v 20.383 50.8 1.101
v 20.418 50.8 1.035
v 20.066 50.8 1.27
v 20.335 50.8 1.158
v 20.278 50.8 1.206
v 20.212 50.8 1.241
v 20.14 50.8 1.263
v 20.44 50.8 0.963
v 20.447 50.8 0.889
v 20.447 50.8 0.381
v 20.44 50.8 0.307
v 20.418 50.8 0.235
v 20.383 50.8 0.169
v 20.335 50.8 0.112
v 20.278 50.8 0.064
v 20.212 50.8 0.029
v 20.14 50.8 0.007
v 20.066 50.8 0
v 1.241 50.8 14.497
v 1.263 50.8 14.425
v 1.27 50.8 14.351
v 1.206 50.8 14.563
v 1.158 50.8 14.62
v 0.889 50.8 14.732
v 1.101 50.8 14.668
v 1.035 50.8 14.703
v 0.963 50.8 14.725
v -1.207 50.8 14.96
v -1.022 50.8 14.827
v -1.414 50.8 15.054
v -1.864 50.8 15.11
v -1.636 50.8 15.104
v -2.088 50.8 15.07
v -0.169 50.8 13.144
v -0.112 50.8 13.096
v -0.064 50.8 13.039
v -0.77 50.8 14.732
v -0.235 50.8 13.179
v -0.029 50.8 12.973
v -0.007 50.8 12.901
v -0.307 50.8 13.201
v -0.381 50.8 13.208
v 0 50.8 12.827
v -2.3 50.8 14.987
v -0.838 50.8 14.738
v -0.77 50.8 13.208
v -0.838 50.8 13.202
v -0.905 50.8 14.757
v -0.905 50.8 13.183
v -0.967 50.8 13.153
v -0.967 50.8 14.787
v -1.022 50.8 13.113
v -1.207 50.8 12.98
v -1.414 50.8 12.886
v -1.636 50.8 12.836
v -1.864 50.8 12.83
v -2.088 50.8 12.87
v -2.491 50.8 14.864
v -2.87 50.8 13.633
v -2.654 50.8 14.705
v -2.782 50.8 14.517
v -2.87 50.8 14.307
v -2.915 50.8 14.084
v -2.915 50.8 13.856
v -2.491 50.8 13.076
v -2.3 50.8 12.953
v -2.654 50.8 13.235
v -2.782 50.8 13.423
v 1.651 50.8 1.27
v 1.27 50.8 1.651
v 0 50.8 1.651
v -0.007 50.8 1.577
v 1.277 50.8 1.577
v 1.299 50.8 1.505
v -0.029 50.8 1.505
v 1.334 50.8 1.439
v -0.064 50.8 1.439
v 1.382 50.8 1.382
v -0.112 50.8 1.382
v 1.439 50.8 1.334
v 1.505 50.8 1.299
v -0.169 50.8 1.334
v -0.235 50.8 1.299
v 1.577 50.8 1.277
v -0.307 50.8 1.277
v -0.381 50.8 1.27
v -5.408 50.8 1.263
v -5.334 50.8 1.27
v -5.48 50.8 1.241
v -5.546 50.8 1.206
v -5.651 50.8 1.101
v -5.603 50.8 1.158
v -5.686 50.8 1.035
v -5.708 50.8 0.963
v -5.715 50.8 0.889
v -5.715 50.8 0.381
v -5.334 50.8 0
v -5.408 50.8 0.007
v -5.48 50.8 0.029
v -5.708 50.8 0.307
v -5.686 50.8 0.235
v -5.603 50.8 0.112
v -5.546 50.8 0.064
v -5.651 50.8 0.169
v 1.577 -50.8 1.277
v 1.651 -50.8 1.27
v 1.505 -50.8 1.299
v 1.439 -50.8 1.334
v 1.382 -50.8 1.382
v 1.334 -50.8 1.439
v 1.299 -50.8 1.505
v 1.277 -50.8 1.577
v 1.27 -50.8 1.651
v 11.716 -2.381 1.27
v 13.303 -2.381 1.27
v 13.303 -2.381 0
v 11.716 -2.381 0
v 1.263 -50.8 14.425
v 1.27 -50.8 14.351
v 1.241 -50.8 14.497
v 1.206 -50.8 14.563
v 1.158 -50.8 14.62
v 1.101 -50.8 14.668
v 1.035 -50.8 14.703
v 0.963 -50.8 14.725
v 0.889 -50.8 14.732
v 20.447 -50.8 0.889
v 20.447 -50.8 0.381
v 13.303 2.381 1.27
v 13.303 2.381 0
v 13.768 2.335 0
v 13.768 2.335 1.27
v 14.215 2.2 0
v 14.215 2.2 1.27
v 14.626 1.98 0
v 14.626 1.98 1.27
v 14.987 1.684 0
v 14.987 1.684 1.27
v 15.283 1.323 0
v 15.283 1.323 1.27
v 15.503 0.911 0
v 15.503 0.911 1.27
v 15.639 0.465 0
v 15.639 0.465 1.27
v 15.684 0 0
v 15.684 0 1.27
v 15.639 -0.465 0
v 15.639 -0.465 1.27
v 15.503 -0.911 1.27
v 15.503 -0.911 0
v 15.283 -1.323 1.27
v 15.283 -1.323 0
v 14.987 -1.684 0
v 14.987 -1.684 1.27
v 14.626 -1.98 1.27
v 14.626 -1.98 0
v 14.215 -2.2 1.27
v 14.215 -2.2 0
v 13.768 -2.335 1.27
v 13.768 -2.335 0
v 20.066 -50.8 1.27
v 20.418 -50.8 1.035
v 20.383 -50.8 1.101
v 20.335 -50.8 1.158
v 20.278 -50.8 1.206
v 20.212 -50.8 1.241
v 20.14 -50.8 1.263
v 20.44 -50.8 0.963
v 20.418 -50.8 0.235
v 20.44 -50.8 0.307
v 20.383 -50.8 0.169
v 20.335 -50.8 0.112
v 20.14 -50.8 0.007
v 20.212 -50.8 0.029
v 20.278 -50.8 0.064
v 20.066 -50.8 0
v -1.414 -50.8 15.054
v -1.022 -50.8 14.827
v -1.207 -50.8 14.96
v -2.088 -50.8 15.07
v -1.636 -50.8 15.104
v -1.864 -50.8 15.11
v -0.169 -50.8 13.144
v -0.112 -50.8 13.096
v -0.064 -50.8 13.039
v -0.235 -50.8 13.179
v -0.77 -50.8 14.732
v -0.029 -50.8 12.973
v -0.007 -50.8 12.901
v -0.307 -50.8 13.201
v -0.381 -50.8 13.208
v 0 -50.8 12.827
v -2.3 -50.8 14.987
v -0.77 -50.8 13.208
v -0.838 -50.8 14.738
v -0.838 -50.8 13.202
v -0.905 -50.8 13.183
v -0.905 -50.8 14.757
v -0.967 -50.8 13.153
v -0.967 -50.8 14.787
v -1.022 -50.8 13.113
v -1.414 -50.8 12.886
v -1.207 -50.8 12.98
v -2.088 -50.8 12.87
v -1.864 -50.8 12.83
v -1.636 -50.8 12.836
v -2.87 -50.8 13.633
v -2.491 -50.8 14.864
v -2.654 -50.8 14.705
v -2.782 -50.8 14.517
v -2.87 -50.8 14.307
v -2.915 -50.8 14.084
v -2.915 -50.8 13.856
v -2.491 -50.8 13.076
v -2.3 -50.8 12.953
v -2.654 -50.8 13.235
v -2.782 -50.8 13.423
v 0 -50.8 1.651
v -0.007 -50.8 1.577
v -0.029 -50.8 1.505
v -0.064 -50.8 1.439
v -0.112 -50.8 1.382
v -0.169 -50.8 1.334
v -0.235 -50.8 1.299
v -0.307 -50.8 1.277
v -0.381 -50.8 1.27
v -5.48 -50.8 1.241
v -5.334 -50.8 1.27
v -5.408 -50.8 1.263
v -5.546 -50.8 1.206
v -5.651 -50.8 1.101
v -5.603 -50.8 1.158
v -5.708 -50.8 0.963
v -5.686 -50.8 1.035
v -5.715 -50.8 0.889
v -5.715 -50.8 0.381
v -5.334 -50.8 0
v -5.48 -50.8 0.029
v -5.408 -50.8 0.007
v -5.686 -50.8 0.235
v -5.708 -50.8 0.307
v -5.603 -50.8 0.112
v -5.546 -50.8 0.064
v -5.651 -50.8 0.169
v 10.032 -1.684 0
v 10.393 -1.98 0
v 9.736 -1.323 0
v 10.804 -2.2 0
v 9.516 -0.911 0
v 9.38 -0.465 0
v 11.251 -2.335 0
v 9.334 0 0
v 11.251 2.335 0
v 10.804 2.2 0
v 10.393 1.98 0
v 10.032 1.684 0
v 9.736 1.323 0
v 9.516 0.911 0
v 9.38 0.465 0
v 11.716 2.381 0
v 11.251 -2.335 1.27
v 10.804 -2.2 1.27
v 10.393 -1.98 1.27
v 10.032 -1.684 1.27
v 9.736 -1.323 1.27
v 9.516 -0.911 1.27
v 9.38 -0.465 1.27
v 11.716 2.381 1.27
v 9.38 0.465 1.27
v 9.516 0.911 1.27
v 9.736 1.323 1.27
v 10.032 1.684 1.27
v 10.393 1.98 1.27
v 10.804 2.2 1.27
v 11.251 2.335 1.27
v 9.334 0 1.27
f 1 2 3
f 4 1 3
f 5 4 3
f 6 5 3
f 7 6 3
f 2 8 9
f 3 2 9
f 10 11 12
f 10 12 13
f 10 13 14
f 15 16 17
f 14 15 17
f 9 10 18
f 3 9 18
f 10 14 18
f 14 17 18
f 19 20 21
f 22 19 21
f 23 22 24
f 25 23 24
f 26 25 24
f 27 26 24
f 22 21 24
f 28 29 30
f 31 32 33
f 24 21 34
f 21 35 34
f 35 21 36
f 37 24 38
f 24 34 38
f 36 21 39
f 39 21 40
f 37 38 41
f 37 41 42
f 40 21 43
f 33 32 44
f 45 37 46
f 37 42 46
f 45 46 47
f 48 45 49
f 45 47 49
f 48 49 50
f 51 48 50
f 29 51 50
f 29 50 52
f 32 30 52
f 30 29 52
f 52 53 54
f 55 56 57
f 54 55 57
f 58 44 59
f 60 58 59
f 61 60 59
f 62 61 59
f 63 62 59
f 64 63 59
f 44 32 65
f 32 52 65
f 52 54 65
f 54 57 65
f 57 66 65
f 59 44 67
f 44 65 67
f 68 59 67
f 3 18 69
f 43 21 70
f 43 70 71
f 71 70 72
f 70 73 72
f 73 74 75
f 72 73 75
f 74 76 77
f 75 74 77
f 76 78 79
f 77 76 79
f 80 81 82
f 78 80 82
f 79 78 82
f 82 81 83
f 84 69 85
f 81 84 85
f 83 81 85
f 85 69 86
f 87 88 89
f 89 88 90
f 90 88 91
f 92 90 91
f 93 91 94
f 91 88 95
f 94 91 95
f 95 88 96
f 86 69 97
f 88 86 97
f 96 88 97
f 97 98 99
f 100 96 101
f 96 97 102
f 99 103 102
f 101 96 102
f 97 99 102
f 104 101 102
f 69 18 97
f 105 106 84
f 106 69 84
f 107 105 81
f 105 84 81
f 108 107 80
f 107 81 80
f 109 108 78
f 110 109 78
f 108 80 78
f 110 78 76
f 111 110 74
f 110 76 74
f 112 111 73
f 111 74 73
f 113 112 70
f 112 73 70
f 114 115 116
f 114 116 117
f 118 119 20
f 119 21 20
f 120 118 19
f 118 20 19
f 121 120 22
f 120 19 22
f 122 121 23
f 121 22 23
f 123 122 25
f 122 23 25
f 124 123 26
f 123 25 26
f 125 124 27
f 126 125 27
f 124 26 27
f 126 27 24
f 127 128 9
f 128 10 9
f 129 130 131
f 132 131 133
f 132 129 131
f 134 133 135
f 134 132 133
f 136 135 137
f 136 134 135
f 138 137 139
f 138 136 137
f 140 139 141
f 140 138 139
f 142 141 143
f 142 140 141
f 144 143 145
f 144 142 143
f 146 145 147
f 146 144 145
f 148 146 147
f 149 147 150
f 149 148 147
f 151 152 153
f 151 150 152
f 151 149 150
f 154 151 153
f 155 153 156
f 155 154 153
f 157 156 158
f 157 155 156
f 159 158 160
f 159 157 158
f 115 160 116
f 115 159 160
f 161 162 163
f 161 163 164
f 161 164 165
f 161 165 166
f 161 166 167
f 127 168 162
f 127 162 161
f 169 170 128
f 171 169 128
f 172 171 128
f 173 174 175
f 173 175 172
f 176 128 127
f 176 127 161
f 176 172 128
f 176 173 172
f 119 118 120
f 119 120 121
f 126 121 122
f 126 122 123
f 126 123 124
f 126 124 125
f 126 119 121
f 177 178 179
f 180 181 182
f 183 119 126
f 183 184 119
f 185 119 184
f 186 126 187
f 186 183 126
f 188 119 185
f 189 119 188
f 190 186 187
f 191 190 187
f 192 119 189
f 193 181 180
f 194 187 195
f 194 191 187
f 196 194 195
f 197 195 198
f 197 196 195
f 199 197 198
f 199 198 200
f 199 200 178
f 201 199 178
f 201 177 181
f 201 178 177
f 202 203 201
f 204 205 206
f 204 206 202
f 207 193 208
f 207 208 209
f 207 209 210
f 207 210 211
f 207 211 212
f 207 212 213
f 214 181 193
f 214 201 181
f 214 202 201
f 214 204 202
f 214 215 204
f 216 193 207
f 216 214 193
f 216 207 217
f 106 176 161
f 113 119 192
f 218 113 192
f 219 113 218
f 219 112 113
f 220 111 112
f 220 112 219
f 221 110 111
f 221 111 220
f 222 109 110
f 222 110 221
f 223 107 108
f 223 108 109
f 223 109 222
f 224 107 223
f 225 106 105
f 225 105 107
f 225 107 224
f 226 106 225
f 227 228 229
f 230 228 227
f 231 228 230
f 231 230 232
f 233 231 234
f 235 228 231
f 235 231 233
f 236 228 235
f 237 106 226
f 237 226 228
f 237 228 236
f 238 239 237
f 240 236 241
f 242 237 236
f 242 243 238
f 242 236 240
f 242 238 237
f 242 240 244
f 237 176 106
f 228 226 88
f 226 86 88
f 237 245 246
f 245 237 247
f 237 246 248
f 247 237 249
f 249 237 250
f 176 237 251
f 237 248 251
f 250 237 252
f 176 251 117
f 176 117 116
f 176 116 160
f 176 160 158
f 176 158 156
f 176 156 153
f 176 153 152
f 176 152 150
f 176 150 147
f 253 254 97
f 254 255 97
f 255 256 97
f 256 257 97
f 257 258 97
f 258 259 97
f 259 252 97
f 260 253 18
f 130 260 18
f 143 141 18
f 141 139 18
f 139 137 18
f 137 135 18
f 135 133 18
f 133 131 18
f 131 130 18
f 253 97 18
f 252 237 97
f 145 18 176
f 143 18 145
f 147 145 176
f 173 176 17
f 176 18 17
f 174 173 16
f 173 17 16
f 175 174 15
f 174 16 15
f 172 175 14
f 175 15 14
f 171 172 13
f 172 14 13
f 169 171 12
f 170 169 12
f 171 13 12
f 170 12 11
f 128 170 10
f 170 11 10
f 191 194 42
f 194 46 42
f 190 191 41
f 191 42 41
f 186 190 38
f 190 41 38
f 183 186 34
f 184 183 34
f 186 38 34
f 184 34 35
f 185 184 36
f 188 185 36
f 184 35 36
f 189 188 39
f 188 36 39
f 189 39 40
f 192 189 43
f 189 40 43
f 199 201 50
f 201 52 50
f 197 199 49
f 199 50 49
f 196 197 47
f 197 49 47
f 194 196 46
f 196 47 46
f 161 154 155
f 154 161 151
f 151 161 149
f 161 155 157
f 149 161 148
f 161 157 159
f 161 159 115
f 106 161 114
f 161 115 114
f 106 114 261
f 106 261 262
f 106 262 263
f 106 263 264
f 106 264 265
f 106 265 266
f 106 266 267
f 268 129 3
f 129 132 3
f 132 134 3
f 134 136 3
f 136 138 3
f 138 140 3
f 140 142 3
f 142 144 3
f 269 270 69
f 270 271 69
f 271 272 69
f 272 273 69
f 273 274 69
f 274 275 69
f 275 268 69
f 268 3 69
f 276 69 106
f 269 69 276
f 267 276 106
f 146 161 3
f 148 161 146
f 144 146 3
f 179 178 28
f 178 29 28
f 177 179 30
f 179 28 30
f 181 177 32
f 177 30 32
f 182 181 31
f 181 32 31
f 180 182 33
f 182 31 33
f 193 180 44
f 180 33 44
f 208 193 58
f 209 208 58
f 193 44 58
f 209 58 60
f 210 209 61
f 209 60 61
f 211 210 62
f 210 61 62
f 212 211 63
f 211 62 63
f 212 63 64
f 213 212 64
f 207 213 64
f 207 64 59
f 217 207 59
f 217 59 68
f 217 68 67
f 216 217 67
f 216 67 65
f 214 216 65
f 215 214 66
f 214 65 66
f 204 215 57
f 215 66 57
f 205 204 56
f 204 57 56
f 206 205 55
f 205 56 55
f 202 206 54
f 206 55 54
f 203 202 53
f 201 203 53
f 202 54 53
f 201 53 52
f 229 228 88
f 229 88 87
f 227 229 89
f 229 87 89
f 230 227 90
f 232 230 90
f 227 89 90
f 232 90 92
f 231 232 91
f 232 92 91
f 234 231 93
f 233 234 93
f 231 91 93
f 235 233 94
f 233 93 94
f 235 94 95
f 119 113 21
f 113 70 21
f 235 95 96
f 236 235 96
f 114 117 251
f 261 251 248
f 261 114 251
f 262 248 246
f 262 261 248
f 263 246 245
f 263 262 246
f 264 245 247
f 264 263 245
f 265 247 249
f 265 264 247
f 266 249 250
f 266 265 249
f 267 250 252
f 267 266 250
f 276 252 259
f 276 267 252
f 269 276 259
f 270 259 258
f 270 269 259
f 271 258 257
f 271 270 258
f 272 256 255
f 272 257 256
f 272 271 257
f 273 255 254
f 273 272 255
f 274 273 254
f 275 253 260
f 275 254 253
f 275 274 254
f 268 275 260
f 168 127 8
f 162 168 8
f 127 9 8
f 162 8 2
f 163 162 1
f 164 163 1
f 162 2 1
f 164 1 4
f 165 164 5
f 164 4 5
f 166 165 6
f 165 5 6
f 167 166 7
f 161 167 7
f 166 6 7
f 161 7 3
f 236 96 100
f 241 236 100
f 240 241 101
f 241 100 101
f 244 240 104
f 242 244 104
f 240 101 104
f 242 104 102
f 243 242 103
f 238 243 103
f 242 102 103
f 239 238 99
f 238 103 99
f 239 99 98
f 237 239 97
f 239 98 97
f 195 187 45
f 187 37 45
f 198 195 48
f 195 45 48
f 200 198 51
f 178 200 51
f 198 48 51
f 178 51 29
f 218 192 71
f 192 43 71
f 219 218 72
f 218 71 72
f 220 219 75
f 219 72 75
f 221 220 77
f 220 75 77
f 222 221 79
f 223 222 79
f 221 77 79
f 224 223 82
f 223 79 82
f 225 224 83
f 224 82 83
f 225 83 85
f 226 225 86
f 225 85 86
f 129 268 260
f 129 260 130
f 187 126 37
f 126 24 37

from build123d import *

# Parameters (mm, degrees)
BOSS_EXTRUDE1_DEPTH = 50.8
CUT_EXTRUDE1_DEPTH  = 2.27


with BuildPart() as part:
    # Sketch2 → Boss-Extrude1 (new body, symmetric)
    with BuildSketch(Plane(origin=(0, 0, 0), x_dir=(1, 0, 0), z_dir=(0, 1, 0))):
        with BuildLine():
            Line((-5.334, 0), (20.066, 0))
            ThreePointArc((20.066, 0), (20.335407684, -0.111592316), (20.447, -0.381))
            Line((20.447, -0.381), (20.447, -0.889))
            ThreePointArc((20.447, -0.889), (20.335407684, -1.158407684), (20.066, -1.27))
            Line((20.066, -1.27), (1.651, -1.27))
            ThreePointArc((1.651, -1.27), (1.381592316, -1.381592316), (1.27, -1.651))
            Line((1.27, -1.651), (1.27, -14.351))
            ThreePointArc((1.27, -14.351), (1.158407684, -14.620407684), (0.889, -14.732))
            Line((0.889, -14.732), (-0.76996875, -14.732))
            ThreePointArc((-0.76996875, -14.732), (-0.904672592, -14.756607134), (-1.021976563, -14.82725))
            ThreePointArc((-1.021976563, -14.82725), (-2.921, -13.97), (-1.021976563, -13.11275))
            ThreePointArc((-1.021976563, -13.11275), (-0.904672592, -13.183392866), (-0.76996875, -13.208))
            Line((-0.76996875, -13.208), (-0.381, -13.208))
            ThreePointArc((-0.381, -13.208), (-0.111592316, -13.096407684), (0, -12.827))
            Line((0, -12.827), (0, -1.651))
            ThreePointArc((0, -1.651), (-0.111592316, -1.381592316), (-0.381, -1.27))
            Line((-0.381, -1.27), (-5.334, -1.27))
            ThreePointArc((-5.334, -1.27), (-5.603407684, -1.158407684), (-5.715, -0.889))
            Line((-5.715, -0.889), (-5.715, -0.381))
            ThreePointArc((-5.715, -0.381), (-5.603407684, -0.111592316), (-5.334, 0))
        make_face()
    extrude(amount=BOSS_EXTRUDE1_DEPTH, both=True)

    # Sketch3 → Cut-Extrude1 (cut, through all)
    with BuildSketch(Plane.XY.offset(1.27)):
        with BuildLine():
            Line((11.71575, 2.38125), (13.30325, 2.38125))
            ThreePointArc((13.30325, 2.38125), (15.6845, 0), (13.30325, -2.38125))
            Line((13.30325, -2.38125), (11.71575, -2.38125))
            ThreePointArc((11.71575, -2.38125), (9.3345, 0), (11.71575, 2.38125))
        make_face()
    extrude(amount=-CUT_EXTRUDE1_DEPTH, mode=Mode.SUBTRACT)


solid = part.part
